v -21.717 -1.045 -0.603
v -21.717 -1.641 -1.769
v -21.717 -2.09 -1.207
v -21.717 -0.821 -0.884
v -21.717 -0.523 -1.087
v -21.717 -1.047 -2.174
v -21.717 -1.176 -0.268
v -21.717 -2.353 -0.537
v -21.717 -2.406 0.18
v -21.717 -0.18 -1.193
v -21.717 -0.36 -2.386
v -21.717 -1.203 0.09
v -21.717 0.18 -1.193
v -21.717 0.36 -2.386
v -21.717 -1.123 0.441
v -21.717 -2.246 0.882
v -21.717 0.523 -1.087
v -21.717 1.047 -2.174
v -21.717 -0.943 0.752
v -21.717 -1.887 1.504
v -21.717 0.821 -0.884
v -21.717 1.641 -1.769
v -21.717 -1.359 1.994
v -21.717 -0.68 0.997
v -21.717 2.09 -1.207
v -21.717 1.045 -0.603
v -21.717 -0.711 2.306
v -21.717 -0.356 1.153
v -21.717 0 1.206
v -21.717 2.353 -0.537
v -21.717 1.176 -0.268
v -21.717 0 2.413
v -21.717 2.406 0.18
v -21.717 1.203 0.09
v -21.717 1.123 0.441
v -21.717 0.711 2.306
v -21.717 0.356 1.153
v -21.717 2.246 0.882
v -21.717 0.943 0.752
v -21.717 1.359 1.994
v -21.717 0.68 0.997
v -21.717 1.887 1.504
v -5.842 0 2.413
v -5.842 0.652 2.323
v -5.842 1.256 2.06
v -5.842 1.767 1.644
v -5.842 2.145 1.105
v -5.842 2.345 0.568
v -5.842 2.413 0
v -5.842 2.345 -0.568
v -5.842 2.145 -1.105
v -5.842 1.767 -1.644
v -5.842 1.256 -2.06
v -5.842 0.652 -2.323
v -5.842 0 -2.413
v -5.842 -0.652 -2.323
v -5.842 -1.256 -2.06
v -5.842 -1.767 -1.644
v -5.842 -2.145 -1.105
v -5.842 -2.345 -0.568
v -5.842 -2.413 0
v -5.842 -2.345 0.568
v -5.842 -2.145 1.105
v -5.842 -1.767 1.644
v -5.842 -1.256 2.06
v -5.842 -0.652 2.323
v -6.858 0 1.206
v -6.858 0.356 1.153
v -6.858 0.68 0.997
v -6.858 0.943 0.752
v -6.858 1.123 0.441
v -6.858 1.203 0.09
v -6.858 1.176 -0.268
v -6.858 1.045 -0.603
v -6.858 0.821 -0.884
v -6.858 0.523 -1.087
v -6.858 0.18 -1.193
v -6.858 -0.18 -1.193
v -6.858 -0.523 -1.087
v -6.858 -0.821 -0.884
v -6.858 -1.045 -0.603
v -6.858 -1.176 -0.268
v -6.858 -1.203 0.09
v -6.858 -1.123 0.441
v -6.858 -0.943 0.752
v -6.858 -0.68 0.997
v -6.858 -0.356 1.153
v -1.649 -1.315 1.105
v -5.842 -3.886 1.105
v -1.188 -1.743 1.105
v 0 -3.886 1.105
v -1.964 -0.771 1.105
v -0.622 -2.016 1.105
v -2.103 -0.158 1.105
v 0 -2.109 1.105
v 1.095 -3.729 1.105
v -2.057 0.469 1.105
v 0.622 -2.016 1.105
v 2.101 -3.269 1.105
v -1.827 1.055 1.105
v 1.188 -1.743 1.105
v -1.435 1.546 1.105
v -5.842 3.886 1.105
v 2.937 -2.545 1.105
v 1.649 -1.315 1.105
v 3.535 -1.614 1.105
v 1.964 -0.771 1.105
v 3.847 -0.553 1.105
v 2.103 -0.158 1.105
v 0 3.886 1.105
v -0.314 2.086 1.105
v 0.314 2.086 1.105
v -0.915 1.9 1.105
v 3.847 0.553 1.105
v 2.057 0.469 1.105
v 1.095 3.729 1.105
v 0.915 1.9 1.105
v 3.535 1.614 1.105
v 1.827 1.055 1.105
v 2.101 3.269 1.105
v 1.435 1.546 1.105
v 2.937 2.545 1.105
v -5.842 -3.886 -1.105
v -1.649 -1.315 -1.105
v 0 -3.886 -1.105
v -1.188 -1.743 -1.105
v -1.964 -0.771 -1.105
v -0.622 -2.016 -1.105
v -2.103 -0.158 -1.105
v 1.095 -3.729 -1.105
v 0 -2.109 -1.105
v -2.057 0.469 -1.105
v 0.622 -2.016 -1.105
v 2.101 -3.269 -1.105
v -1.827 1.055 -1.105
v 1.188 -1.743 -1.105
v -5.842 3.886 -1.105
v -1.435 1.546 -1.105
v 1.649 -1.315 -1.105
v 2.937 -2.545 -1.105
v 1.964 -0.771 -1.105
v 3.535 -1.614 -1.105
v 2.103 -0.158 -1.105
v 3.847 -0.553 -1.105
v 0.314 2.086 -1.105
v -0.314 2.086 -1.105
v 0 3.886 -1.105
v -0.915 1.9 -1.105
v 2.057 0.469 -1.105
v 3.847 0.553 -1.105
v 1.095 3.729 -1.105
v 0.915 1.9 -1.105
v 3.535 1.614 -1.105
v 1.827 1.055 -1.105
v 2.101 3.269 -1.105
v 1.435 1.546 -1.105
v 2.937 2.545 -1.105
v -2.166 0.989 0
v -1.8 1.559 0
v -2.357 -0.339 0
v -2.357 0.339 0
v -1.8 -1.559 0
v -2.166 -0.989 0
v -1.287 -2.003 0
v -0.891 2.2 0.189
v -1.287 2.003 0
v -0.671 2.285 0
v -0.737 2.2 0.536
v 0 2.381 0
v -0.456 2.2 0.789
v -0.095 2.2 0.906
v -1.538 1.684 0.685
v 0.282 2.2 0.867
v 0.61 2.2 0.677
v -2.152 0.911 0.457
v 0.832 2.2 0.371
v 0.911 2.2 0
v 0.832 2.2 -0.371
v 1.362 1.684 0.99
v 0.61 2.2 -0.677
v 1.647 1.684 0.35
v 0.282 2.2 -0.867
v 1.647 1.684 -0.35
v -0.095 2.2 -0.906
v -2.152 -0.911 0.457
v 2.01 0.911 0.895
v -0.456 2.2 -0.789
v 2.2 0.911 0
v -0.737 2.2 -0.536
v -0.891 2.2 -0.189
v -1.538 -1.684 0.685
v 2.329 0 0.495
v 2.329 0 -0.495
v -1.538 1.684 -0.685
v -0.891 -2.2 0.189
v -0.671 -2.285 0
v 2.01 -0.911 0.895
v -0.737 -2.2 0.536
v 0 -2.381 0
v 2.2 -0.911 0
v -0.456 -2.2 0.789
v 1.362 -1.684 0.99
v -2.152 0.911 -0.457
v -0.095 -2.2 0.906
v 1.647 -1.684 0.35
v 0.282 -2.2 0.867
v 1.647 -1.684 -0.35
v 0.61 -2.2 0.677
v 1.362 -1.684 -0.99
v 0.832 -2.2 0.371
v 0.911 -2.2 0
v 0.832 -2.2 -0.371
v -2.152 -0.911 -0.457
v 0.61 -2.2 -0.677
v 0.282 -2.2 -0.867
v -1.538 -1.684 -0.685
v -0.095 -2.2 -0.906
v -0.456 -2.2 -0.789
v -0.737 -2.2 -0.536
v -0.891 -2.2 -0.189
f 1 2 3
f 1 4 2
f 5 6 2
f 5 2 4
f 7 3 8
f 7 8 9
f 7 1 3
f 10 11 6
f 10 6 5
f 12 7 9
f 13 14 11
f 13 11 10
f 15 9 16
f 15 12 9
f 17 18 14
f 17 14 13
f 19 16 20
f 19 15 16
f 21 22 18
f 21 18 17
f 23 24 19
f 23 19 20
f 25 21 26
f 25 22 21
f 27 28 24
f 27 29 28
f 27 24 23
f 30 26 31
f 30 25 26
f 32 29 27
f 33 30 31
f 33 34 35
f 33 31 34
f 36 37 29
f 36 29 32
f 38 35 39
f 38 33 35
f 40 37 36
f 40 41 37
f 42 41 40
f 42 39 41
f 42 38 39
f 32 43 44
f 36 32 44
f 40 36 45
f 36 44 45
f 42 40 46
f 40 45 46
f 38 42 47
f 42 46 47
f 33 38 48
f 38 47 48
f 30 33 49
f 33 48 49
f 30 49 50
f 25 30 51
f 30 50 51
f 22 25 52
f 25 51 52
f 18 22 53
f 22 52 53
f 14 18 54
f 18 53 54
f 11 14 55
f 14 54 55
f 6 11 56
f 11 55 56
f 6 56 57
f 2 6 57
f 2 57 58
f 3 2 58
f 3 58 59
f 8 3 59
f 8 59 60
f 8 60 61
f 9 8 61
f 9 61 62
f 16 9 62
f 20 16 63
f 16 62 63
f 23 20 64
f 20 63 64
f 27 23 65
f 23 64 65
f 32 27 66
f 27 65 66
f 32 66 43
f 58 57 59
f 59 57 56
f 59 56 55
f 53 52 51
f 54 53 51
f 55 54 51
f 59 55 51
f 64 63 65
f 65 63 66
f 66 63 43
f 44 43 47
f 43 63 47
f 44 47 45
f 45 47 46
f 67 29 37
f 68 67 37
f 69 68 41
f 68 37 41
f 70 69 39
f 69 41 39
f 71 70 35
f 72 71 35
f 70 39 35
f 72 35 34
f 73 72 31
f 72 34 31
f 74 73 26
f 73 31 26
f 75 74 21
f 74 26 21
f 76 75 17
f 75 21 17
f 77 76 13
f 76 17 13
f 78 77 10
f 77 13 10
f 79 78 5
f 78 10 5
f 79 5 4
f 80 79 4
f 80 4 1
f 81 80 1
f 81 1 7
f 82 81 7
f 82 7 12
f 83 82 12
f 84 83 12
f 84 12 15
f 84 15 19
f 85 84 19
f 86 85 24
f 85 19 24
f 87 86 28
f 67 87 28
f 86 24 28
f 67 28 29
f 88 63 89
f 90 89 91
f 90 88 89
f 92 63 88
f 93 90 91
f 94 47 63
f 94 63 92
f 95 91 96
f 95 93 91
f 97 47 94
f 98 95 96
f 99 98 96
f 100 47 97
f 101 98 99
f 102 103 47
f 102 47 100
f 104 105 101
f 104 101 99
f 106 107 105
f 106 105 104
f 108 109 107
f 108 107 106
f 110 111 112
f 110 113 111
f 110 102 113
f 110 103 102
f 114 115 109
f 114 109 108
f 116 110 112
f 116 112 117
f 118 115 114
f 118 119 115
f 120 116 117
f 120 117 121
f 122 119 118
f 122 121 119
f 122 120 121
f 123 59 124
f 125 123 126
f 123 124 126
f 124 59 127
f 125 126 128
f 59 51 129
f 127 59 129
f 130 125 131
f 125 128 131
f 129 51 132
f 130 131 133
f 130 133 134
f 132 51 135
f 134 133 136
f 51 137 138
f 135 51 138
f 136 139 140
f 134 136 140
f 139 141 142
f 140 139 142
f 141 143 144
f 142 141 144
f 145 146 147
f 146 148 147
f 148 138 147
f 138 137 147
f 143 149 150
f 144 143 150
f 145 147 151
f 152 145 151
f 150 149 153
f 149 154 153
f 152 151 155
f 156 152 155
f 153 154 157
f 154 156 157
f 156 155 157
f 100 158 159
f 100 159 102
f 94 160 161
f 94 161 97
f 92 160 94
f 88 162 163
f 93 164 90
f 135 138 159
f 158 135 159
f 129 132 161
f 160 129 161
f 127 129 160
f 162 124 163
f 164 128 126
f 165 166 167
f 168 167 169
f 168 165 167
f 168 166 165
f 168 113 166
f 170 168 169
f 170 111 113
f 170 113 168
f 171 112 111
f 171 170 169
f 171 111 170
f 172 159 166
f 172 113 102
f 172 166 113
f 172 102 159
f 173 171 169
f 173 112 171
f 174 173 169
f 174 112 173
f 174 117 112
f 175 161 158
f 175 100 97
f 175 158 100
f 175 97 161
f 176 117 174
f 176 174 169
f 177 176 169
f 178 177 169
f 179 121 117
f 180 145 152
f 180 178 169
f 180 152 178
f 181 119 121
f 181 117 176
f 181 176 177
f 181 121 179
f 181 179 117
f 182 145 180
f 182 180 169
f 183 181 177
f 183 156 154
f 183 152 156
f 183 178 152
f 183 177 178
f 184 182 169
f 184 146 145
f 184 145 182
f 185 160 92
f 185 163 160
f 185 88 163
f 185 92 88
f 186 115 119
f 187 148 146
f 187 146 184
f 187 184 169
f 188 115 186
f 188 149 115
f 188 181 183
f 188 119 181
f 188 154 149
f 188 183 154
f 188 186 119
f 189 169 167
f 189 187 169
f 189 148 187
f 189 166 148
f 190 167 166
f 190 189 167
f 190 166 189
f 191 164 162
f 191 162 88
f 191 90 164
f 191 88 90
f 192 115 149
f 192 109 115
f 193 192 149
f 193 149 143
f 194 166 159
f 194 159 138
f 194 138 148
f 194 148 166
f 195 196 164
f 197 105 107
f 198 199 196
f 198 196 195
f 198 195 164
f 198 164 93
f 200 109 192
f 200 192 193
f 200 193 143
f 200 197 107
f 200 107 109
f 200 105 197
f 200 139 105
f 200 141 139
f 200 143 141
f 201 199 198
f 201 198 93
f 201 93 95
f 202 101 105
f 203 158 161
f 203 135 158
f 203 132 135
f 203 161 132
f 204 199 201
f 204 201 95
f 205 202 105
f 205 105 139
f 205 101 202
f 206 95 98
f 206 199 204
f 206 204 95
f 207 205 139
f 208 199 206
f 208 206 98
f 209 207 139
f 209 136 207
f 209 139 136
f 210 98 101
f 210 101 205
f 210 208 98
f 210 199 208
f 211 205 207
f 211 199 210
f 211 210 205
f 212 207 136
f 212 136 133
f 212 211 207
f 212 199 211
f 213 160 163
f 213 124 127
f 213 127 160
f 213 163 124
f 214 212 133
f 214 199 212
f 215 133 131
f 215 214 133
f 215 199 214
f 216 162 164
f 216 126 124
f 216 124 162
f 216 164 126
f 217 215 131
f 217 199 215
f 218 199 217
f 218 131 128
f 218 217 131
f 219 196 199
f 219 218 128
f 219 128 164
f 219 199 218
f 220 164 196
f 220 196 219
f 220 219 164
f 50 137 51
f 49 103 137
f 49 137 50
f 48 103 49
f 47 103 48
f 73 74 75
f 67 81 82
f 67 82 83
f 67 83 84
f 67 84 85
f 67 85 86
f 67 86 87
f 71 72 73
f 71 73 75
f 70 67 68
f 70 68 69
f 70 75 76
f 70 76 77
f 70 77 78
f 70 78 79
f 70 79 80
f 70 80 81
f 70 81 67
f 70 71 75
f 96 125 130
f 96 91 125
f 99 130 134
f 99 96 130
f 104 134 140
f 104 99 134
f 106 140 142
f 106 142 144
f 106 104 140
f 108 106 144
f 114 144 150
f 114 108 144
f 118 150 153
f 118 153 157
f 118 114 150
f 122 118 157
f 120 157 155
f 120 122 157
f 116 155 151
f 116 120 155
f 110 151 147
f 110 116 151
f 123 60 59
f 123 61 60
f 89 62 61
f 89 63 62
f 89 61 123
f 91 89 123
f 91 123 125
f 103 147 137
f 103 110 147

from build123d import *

# Parameters (mm, degrees)
EXTRUDE1_DEPTH      = 1.1049
EXTRUDE1_DEPTH_BACK = 1.1049
SKETCH2_R           = 2.413
EXTRUDE2_DEPTH      = 15.875
SKETCH3_R           = 1.2065
EXTRUDE3_DEPTH      = 14.859


with BuildPart() as part:
    # Sketch1 → Extrude1 (new body, two sides)
    with BuildSketch(Plane.XY) as extrude1_sk:
        with BuildLine():
            Line((0, 3.8862), (-5.842, 3.8862))
            Line((-5.842, 3.8862), (-5.842, -3.8862))
            Line((-5.842, -3.8862), (0, -3.8862))
            ThreePointArc((0, -3.8862), (3.8862, 0), (0, 3.8862))
        make_face()
    extrude(amount=EXTRUDE1_DEPTH)
    extrude(extrude1_sk.sketch, amount=-EXTRUDE1_DEPTH_BACK)

    # Sketch2 → Extrude2 (add)
    with BuildSketch(Plane.ZY.offset(5.842)):
        Circle(SKETCH2_R)
    extrude(amount=EXTRUDE2_DEPTH)

    # Sketch3 → Extrude3 (cut)
    with BuildSketch(Plane.ZY.offset(21.717)):
        Circle(SKETCH3_R)
    extrude(amount=-EXTRUDE3_DEPTH, mode=Mode.SUBTRACT)

    # Sketch6 → Cut-Revolve1 (revolve, cut)
    with BuildSketch(Plane.XY):
        with BuildLine():
            Line((0, -2.38125), (0, 2.38125))
            ThreePointArc((0, 2.38125), (-2.38125, 0), (0, -2.38125))
        make_face()
    revolve(axis=Axis((0, -2.38125, 0), (0, 1, 0)), mode=Mode.SUBTRACT)


solid = part.part
